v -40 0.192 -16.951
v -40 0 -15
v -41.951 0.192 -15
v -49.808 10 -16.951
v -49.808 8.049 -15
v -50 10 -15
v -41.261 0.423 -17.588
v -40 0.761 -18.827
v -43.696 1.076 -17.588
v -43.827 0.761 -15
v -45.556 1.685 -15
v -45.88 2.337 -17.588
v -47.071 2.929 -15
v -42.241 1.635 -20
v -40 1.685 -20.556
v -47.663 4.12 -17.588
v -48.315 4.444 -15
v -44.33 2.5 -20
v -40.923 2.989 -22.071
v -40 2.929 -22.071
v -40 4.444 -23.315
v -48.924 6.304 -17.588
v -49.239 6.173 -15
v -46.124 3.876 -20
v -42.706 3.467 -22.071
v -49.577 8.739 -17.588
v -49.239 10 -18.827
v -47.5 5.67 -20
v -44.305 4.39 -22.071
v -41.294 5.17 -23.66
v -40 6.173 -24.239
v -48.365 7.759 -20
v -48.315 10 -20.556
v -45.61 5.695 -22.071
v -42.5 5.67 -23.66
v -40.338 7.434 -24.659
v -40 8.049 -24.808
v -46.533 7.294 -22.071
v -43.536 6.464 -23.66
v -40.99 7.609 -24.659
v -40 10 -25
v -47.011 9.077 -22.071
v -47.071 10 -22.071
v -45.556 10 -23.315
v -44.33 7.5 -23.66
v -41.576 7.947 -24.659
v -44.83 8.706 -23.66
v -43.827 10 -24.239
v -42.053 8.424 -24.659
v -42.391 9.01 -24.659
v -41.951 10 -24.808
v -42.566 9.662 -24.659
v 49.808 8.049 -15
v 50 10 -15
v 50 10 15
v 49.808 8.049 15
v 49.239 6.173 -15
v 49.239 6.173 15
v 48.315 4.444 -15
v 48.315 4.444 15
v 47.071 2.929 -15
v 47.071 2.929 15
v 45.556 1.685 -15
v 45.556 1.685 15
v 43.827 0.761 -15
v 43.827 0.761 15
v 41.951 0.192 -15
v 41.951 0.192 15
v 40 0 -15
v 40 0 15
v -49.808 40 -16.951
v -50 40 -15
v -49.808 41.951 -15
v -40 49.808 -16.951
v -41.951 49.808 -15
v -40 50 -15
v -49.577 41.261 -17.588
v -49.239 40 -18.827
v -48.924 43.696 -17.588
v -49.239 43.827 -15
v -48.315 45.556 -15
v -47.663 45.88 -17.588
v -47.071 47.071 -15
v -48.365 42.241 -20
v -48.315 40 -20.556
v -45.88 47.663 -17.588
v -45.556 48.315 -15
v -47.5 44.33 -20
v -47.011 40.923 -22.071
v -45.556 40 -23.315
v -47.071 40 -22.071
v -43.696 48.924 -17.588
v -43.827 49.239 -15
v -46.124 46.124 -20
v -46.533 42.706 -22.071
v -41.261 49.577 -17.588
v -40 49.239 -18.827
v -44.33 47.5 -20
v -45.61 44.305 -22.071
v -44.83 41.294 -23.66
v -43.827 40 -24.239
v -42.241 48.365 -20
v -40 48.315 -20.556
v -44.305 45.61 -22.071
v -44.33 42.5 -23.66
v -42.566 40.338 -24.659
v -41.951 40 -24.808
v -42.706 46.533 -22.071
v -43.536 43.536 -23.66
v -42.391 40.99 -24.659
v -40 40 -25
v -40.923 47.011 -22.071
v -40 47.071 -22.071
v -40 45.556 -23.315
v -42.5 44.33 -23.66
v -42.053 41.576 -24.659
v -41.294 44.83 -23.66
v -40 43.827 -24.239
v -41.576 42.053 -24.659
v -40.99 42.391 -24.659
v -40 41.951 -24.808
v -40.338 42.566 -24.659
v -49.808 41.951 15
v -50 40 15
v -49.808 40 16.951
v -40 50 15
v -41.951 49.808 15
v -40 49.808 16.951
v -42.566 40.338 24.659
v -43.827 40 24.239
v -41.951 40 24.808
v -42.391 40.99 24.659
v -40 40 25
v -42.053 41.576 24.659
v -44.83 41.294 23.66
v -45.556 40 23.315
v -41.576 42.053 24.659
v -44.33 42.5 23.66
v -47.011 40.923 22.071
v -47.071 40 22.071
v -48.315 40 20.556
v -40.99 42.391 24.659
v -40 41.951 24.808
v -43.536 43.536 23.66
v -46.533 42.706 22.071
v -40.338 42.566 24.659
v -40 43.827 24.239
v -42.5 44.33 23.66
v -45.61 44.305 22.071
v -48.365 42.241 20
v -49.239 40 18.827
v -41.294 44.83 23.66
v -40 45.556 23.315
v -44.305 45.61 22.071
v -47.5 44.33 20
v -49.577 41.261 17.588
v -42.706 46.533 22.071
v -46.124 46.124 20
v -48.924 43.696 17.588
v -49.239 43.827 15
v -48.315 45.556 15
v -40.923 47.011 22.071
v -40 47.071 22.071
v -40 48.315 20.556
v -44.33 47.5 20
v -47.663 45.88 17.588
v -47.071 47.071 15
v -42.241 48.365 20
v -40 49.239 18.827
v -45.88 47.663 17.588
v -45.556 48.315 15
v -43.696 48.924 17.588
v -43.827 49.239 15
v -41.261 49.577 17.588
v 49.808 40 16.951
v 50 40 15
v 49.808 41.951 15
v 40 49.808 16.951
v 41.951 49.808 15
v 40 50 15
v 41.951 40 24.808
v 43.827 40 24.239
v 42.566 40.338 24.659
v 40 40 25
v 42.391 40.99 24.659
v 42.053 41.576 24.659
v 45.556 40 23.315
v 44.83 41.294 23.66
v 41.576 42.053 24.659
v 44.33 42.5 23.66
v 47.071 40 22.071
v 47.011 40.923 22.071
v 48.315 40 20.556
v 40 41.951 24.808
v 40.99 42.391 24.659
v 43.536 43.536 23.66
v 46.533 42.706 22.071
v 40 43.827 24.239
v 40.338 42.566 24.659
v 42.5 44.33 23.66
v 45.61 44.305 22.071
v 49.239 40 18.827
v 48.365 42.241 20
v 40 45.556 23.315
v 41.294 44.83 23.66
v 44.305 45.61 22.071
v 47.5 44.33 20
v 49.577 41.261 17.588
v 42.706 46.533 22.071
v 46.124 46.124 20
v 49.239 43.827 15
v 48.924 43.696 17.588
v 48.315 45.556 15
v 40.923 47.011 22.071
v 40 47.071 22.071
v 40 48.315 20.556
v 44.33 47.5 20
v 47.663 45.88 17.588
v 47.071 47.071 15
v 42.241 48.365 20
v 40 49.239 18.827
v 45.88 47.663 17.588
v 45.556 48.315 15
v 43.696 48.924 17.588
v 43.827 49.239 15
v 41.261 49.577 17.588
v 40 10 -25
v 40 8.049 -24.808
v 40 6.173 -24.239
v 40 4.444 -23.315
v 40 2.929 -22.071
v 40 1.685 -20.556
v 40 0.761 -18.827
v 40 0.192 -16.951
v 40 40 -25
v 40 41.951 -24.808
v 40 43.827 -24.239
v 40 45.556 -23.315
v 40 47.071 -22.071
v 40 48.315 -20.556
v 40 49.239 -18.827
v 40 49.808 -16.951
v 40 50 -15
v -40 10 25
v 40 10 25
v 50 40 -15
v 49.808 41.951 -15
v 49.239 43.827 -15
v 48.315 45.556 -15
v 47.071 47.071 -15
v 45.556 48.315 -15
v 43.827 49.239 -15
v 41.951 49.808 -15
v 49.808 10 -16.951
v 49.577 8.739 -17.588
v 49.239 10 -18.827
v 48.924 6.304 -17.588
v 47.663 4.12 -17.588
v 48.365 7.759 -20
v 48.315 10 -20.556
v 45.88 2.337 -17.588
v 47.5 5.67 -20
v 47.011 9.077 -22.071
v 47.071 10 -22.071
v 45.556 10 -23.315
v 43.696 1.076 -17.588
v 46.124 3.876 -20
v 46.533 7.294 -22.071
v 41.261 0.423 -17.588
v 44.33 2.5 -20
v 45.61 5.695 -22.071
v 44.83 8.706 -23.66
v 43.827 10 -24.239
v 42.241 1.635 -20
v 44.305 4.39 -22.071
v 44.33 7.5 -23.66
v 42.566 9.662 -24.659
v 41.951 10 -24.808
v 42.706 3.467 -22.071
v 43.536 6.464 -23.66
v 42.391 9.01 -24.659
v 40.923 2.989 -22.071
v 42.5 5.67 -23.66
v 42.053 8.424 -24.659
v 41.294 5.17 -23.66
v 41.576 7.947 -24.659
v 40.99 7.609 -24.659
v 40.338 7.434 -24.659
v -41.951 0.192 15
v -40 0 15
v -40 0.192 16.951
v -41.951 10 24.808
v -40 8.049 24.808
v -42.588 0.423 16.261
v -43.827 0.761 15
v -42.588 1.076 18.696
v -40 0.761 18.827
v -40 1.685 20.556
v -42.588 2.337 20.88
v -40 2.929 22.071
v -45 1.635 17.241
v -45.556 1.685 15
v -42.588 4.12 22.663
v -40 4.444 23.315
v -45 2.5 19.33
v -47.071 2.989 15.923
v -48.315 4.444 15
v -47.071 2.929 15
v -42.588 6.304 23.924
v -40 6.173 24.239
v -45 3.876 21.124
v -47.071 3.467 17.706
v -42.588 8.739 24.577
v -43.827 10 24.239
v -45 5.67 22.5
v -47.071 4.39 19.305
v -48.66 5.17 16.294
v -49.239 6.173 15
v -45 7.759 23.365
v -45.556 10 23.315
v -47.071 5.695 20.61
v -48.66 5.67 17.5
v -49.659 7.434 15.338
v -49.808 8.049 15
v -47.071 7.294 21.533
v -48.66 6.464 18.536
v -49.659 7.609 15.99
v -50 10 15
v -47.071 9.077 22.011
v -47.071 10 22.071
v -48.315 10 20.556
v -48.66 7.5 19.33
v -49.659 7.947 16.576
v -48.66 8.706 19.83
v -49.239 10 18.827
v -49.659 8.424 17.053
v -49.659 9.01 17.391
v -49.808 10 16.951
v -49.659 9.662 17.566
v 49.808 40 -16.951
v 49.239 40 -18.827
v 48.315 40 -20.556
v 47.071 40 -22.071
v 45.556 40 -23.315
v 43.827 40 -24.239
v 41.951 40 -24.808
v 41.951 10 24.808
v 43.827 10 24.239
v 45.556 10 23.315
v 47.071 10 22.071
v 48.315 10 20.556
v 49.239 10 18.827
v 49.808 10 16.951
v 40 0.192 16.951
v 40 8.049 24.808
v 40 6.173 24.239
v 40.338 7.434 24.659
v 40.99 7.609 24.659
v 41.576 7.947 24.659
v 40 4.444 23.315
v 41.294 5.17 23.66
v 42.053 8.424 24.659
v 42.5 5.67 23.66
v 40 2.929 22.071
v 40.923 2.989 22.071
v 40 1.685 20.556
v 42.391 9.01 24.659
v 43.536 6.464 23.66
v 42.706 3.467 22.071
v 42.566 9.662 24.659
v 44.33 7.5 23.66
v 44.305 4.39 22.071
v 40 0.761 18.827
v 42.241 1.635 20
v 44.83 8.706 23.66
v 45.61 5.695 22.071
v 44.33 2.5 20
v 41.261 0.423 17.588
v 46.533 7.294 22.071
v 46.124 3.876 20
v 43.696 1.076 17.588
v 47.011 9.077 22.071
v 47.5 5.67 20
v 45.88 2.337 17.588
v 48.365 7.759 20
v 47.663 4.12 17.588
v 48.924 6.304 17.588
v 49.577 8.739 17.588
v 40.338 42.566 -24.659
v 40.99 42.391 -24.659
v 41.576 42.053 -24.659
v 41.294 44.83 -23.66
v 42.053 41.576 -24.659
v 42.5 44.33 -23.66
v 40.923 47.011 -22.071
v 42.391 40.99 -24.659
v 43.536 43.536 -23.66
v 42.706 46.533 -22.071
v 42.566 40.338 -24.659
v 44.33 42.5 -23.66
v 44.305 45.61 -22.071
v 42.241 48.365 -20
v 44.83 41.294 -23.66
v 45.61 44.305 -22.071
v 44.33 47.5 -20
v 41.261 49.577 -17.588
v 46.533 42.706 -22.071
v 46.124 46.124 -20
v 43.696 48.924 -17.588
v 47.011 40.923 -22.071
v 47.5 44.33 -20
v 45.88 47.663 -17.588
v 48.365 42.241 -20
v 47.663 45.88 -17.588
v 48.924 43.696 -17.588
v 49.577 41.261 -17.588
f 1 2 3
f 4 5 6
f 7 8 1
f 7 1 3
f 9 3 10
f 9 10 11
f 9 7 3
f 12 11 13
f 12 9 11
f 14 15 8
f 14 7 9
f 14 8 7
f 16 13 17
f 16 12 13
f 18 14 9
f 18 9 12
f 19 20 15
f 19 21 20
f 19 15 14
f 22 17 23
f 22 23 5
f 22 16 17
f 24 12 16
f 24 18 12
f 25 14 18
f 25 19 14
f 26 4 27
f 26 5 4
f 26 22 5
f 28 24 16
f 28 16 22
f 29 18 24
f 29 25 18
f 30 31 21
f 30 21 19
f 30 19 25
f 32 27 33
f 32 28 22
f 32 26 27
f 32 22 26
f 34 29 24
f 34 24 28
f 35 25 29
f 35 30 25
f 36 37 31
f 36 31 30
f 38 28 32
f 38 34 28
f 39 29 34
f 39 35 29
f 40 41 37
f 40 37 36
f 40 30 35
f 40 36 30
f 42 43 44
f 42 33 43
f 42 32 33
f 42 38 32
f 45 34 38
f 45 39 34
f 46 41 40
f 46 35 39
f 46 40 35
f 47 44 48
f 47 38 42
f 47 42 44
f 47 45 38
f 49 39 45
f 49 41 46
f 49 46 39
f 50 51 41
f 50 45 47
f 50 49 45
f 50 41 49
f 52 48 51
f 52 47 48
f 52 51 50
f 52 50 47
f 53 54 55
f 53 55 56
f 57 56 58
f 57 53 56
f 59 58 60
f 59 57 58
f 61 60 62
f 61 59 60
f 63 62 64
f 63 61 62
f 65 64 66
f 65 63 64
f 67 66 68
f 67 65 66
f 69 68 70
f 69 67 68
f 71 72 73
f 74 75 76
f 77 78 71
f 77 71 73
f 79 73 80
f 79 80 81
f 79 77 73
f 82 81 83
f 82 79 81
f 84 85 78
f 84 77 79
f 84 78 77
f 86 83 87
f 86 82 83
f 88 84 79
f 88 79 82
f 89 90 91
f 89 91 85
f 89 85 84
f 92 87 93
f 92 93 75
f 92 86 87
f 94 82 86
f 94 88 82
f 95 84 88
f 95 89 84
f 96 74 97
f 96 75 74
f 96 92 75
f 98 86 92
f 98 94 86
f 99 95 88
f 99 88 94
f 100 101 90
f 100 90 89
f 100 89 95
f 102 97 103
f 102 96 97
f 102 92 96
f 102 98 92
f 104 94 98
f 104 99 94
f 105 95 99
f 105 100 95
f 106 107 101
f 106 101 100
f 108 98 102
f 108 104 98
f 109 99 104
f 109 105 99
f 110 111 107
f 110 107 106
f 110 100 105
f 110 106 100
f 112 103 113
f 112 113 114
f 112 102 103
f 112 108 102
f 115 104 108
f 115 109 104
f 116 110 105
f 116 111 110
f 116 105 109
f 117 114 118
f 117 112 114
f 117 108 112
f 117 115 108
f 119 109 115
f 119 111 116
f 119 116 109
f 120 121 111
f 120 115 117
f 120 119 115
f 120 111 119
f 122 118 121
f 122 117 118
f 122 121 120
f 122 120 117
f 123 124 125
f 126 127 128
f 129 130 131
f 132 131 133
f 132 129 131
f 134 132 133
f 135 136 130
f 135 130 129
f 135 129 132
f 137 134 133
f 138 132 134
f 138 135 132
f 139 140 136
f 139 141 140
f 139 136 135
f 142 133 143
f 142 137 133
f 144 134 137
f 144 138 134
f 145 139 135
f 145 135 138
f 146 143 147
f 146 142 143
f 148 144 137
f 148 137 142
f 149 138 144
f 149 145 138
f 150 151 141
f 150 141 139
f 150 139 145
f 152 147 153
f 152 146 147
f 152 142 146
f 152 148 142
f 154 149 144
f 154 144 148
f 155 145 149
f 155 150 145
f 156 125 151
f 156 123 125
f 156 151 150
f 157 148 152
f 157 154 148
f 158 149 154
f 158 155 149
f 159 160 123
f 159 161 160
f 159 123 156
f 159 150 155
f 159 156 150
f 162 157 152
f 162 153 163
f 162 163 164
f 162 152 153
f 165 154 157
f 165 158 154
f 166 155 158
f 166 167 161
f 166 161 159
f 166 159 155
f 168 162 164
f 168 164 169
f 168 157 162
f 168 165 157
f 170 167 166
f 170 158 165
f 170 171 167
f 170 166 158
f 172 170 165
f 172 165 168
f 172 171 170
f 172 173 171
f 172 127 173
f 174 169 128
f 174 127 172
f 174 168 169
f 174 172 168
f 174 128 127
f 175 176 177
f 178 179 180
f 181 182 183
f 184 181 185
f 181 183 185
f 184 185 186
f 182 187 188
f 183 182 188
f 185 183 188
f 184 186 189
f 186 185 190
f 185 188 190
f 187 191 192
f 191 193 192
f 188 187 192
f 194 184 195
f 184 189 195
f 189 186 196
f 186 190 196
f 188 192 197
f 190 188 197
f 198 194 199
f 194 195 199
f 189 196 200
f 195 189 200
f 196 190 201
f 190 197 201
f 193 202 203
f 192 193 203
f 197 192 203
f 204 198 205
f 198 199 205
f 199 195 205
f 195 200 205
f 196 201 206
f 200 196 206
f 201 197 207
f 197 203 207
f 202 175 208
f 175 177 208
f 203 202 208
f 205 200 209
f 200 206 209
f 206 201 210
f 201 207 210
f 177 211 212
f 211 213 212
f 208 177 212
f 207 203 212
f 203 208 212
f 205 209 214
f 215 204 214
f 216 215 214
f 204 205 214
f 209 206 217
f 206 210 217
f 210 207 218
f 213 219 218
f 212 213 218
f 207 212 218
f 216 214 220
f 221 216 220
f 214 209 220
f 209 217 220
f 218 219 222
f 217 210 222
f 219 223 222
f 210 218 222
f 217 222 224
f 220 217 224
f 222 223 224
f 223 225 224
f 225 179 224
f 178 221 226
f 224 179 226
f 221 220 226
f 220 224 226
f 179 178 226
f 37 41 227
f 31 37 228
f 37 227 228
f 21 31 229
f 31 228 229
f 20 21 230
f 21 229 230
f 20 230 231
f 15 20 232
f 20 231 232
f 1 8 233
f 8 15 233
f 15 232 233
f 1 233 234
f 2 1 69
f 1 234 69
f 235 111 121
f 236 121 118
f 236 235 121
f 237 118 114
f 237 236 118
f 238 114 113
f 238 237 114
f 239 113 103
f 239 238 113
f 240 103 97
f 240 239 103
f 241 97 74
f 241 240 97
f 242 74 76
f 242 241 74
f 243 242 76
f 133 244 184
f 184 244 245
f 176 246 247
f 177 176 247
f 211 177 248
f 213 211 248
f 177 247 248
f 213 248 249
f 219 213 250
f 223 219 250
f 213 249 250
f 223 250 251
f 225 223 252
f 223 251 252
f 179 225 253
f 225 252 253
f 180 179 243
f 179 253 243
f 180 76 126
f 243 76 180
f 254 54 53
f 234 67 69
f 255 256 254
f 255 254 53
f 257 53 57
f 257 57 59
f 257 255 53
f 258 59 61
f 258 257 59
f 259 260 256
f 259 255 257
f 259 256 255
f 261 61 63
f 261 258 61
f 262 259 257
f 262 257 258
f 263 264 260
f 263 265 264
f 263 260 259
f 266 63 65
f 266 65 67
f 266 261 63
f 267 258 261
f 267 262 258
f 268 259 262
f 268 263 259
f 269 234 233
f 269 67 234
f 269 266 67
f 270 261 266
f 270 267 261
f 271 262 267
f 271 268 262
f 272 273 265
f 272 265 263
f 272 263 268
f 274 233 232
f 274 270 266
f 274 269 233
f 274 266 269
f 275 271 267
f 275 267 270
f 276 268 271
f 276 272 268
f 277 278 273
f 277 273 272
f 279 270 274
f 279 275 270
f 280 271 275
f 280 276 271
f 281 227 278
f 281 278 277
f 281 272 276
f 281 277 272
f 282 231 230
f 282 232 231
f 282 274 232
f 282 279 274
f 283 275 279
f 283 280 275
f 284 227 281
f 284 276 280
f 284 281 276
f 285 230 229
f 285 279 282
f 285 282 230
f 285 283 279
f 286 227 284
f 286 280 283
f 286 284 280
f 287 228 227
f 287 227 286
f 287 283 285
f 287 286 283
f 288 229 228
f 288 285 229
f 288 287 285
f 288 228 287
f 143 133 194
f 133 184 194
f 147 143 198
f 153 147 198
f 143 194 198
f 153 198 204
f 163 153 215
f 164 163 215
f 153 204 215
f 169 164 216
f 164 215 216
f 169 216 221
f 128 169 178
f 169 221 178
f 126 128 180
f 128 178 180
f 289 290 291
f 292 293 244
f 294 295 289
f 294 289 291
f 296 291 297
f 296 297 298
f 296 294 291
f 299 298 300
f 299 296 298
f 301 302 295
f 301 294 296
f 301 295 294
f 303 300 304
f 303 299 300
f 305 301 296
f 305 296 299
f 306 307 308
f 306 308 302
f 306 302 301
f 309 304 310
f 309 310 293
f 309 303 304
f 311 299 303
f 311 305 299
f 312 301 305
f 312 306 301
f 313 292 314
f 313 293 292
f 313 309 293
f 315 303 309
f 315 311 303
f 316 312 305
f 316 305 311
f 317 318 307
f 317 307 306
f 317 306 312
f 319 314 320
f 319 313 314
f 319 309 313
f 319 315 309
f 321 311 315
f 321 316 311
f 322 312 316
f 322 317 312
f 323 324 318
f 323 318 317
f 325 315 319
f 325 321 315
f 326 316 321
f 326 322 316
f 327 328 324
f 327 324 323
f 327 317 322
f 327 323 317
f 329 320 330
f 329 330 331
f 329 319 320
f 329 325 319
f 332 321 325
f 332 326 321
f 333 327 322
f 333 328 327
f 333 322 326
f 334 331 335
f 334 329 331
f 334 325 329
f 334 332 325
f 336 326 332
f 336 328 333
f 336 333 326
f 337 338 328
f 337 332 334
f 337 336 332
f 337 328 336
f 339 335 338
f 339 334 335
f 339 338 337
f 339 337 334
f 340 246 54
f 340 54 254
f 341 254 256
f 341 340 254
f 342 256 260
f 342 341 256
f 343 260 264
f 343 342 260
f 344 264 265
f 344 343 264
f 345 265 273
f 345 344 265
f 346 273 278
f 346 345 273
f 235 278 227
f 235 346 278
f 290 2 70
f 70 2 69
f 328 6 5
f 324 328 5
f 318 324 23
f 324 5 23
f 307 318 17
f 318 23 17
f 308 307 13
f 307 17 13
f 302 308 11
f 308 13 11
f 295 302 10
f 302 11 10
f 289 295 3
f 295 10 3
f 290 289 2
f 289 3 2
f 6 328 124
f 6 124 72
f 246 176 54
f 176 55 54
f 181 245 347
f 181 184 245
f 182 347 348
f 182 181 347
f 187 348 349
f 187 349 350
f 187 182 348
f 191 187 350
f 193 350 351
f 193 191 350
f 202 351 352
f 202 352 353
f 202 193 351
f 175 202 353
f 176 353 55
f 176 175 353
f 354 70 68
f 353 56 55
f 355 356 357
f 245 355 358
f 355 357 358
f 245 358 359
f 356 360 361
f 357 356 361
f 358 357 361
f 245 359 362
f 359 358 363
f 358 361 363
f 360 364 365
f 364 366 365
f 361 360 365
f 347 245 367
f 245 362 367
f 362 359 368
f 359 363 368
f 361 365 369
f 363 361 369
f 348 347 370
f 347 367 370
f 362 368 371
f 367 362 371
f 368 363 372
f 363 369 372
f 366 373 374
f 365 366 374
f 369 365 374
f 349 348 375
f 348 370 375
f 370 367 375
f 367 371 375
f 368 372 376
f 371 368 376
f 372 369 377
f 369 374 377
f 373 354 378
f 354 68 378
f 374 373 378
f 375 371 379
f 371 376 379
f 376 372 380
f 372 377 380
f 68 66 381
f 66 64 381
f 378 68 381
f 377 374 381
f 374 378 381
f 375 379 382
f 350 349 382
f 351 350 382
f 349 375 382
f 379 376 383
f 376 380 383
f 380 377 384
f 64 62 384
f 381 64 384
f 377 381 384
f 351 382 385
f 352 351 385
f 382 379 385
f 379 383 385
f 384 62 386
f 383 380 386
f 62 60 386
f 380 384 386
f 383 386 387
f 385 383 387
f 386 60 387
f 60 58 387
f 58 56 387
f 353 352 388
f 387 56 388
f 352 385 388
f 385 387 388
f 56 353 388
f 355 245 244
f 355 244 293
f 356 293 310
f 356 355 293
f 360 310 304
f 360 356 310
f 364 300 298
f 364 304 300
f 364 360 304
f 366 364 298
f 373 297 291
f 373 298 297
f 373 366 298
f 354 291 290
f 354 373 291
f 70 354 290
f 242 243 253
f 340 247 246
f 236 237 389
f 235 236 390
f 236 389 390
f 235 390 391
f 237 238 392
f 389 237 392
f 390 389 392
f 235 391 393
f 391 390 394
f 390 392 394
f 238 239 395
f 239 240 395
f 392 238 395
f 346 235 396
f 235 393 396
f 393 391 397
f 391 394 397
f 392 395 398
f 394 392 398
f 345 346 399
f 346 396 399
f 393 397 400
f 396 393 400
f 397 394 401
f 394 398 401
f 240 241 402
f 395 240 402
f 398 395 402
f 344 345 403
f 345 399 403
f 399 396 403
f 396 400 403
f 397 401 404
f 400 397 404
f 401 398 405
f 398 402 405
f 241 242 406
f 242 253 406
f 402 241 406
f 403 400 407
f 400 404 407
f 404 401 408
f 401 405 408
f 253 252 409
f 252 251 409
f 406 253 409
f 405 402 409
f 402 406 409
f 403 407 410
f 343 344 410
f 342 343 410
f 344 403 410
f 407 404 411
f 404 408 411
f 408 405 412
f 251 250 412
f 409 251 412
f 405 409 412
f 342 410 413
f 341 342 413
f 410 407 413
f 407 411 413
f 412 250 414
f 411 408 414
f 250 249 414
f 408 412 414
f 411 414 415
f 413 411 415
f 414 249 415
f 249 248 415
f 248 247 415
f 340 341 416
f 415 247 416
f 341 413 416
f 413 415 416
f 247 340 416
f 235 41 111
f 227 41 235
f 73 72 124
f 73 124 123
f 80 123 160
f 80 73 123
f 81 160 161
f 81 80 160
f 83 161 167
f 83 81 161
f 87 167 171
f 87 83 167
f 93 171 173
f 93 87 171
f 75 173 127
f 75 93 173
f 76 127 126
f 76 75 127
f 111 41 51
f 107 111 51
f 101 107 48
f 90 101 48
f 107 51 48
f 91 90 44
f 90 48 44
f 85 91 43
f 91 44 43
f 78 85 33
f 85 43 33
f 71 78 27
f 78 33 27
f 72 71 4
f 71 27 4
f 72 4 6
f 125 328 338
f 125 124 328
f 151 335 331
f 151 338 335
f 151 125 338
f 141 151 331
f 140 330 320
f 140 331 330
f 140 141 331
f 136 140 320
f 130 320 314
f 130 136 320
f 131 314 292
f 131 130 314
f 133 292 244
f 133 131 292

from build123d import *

# Parameters (mm, degrees)
SKETCH1_W           = 100
SKETCH1_H           = 50
BOSS_EXTRUDE1_DEPTH = 50
FILLET1_R           = 10
FILLET2_R           = 10


with BuildPart() as part:
    # Sketch1 → Boss-Extrude1 (new body)
    with BuildSketch(Plane(origin=(0, 0, 0), x_dir=(1, 0, 0), z_dir=(0, 1, 0))):
        Rectangle(SKETCH1_W, SKETCH1_H)
    extrude(amount=BOSS_EXTRUDE1_DEPTH)

    # Fillet1
    fillet1_edges = [part.edges().sort_by_distance(p)[0] for p in [
        (50, 50, 0),
        (0, 50, -25),
        (-50, 50, 0),
        (50, 0, 0),
        (0, 0, 25),
        (50, 25, -25),
        (50, 25, 25),
        (-50, 25, 25),
        (0, 50, 25),
    ]]
    fillet(fillet1_edges, radius=FILLET1_R)

    # Fillet2
    # the kernel refuses this fillet: 10 mm, written as the material it takes off along each edge
    with BuildSketch(Plane(origin=(-40, 10, 15), x_dir=(0, -1, 0), z_dir=(-1, 0, 0))) as fillet2_piece_1_section:
        Polygon((0, 0), (FILLET2_R, 0), (FILLET2_R, FILLET2_R), (0, FILLET2_R), align=None)
    fillet2_piece_1 = extrude(amount=FILLET2_R, mode=Mode.PRIVATE)
    fillet2_piece_1 = fillet2_piece_1 - Plane(origin=(-40, 10, 15), x_dir=(0, 0.7071067811865475, -0.7071067811865475), z_dir=(-1, 0, 0)) * Sphere(FILLET2_R, mode=Mode.PRIVATE)
    add(fillet2_piece_1, mode=Mode.SUBTRACT)
    with BuildSketch(Plane(origin=(-40, 40, -15), x_dir=(-1, 0, 0), z_dir=(0, 0, -1))) as fillet2_piece_2_section:
        Polygon((0, 0), (FILLET2_R, 0), (FILLET2_R, FILLET2_R), (0, FILLET2_R), align=None)
    fillet2_piece_2 = extrude(amount=FILLET2_R, mode=Mode.PRIVATE)
    fillet2_piece_2 = fillet2_piece_2 - Plane(origin=(-40, 40, -15), x_dir=(0.7071067811865475, -0.7071067811865475, 0), z_dir=(0, 0, -1)) * Sphere(FILLET2_R, mode=Mode.PRIVATE)
    add(fillet2_piece_2, mode=Mode.SUBTRACT)
    with BuildSketch(Plane(origin=(40, 10, -15), x_dir=(0, -1, 0), z_dir=(0, 0, -1))) as fillet2_piece_3_section:
        Polygon((0, 0), (FILLET2_R, 0), (FILLET2_R, -FILLET2_R), (0, -FILLET2_R), align=None)
    fillet2_piece_3 = extrude(amount=FILLET2_R, mode=Mode.PRIVATE)
    fillet2_piece_3 = fillet2_piece_3 - Plane(origin=(40, 10, -15), x_dir=(-0.7071067811865475, 0.7071067811865475, 0), z_dir=(0, 0, -1)) * Sphere(FILLET2_R, mode=Mode.PRIVATE)
    add(fillet2_piece_3, mode=Mode.SUBTRACT)
    with BuildSketch(Plane(origin=(-40, 10, -15), x_dir=(-1, 0, 0), z_dir=(0, 0, -1))) as fillet2_piece_4_section:
        Polygon((0, 0), (FILLET2_R, 0), (FILLET2_R, -FILLET2_R), (0, -FILLET2_R), align=None)
    fillet2_piece_4 = extrude(amount=FILLET2_R, mode=Mode.PRIVATE)
    fillet2_piece_4 = fillet2_piece_4 - Plane(origin=(-40, 10, -15), x_dir=(0.7071067811865475, 0.7071067811865475, 0), z_dir=(0, 0, -1)) * Sphere(FILLET2_R, mode=Mode.PRIVATE)
    add(fillet2_piece_4, mode=Mode.SUBTRACT)
    with BuildSketch(Plane(origin=(40, 0, -25), x_dir=(0, 1, 0), z_dir=(-1, 0, 0))) as fillet2_piece_5:
        with BuildLine():
            CenterArc((FILLET2_R, -FILLET2_R), FILLET2_R, 90, 90)
            Line((0, -FILLET2_R), (0, 0))
            Line((0, 0), (FILLET2_R, 0))
        make_face()
    extrude(amount=80, mode=Mode.SUBTRACT)
    with BuildSketch(Plane(origin=(-50, 10, -25), x_dir=(1, 0, 0), z_dir=(0, 1, 0)), Plane(origin=(-50, 0, -15), x_dir=(0, 1, 0), z_dir=(0, 0, 1))) as fillet2_piece_6:
        with BuildLine():
            CenterArc((FILLET2_R, -FILLET2_R), FILLET2_R, 90, 90)
            Line((0, -FILLET2_R), (0, 0))
            Line((0, 0), (FILLET2_R, 0))
        make_face()
    extrude(amount=30, mode=Mode.SUBTRACT)


solid = part.part
